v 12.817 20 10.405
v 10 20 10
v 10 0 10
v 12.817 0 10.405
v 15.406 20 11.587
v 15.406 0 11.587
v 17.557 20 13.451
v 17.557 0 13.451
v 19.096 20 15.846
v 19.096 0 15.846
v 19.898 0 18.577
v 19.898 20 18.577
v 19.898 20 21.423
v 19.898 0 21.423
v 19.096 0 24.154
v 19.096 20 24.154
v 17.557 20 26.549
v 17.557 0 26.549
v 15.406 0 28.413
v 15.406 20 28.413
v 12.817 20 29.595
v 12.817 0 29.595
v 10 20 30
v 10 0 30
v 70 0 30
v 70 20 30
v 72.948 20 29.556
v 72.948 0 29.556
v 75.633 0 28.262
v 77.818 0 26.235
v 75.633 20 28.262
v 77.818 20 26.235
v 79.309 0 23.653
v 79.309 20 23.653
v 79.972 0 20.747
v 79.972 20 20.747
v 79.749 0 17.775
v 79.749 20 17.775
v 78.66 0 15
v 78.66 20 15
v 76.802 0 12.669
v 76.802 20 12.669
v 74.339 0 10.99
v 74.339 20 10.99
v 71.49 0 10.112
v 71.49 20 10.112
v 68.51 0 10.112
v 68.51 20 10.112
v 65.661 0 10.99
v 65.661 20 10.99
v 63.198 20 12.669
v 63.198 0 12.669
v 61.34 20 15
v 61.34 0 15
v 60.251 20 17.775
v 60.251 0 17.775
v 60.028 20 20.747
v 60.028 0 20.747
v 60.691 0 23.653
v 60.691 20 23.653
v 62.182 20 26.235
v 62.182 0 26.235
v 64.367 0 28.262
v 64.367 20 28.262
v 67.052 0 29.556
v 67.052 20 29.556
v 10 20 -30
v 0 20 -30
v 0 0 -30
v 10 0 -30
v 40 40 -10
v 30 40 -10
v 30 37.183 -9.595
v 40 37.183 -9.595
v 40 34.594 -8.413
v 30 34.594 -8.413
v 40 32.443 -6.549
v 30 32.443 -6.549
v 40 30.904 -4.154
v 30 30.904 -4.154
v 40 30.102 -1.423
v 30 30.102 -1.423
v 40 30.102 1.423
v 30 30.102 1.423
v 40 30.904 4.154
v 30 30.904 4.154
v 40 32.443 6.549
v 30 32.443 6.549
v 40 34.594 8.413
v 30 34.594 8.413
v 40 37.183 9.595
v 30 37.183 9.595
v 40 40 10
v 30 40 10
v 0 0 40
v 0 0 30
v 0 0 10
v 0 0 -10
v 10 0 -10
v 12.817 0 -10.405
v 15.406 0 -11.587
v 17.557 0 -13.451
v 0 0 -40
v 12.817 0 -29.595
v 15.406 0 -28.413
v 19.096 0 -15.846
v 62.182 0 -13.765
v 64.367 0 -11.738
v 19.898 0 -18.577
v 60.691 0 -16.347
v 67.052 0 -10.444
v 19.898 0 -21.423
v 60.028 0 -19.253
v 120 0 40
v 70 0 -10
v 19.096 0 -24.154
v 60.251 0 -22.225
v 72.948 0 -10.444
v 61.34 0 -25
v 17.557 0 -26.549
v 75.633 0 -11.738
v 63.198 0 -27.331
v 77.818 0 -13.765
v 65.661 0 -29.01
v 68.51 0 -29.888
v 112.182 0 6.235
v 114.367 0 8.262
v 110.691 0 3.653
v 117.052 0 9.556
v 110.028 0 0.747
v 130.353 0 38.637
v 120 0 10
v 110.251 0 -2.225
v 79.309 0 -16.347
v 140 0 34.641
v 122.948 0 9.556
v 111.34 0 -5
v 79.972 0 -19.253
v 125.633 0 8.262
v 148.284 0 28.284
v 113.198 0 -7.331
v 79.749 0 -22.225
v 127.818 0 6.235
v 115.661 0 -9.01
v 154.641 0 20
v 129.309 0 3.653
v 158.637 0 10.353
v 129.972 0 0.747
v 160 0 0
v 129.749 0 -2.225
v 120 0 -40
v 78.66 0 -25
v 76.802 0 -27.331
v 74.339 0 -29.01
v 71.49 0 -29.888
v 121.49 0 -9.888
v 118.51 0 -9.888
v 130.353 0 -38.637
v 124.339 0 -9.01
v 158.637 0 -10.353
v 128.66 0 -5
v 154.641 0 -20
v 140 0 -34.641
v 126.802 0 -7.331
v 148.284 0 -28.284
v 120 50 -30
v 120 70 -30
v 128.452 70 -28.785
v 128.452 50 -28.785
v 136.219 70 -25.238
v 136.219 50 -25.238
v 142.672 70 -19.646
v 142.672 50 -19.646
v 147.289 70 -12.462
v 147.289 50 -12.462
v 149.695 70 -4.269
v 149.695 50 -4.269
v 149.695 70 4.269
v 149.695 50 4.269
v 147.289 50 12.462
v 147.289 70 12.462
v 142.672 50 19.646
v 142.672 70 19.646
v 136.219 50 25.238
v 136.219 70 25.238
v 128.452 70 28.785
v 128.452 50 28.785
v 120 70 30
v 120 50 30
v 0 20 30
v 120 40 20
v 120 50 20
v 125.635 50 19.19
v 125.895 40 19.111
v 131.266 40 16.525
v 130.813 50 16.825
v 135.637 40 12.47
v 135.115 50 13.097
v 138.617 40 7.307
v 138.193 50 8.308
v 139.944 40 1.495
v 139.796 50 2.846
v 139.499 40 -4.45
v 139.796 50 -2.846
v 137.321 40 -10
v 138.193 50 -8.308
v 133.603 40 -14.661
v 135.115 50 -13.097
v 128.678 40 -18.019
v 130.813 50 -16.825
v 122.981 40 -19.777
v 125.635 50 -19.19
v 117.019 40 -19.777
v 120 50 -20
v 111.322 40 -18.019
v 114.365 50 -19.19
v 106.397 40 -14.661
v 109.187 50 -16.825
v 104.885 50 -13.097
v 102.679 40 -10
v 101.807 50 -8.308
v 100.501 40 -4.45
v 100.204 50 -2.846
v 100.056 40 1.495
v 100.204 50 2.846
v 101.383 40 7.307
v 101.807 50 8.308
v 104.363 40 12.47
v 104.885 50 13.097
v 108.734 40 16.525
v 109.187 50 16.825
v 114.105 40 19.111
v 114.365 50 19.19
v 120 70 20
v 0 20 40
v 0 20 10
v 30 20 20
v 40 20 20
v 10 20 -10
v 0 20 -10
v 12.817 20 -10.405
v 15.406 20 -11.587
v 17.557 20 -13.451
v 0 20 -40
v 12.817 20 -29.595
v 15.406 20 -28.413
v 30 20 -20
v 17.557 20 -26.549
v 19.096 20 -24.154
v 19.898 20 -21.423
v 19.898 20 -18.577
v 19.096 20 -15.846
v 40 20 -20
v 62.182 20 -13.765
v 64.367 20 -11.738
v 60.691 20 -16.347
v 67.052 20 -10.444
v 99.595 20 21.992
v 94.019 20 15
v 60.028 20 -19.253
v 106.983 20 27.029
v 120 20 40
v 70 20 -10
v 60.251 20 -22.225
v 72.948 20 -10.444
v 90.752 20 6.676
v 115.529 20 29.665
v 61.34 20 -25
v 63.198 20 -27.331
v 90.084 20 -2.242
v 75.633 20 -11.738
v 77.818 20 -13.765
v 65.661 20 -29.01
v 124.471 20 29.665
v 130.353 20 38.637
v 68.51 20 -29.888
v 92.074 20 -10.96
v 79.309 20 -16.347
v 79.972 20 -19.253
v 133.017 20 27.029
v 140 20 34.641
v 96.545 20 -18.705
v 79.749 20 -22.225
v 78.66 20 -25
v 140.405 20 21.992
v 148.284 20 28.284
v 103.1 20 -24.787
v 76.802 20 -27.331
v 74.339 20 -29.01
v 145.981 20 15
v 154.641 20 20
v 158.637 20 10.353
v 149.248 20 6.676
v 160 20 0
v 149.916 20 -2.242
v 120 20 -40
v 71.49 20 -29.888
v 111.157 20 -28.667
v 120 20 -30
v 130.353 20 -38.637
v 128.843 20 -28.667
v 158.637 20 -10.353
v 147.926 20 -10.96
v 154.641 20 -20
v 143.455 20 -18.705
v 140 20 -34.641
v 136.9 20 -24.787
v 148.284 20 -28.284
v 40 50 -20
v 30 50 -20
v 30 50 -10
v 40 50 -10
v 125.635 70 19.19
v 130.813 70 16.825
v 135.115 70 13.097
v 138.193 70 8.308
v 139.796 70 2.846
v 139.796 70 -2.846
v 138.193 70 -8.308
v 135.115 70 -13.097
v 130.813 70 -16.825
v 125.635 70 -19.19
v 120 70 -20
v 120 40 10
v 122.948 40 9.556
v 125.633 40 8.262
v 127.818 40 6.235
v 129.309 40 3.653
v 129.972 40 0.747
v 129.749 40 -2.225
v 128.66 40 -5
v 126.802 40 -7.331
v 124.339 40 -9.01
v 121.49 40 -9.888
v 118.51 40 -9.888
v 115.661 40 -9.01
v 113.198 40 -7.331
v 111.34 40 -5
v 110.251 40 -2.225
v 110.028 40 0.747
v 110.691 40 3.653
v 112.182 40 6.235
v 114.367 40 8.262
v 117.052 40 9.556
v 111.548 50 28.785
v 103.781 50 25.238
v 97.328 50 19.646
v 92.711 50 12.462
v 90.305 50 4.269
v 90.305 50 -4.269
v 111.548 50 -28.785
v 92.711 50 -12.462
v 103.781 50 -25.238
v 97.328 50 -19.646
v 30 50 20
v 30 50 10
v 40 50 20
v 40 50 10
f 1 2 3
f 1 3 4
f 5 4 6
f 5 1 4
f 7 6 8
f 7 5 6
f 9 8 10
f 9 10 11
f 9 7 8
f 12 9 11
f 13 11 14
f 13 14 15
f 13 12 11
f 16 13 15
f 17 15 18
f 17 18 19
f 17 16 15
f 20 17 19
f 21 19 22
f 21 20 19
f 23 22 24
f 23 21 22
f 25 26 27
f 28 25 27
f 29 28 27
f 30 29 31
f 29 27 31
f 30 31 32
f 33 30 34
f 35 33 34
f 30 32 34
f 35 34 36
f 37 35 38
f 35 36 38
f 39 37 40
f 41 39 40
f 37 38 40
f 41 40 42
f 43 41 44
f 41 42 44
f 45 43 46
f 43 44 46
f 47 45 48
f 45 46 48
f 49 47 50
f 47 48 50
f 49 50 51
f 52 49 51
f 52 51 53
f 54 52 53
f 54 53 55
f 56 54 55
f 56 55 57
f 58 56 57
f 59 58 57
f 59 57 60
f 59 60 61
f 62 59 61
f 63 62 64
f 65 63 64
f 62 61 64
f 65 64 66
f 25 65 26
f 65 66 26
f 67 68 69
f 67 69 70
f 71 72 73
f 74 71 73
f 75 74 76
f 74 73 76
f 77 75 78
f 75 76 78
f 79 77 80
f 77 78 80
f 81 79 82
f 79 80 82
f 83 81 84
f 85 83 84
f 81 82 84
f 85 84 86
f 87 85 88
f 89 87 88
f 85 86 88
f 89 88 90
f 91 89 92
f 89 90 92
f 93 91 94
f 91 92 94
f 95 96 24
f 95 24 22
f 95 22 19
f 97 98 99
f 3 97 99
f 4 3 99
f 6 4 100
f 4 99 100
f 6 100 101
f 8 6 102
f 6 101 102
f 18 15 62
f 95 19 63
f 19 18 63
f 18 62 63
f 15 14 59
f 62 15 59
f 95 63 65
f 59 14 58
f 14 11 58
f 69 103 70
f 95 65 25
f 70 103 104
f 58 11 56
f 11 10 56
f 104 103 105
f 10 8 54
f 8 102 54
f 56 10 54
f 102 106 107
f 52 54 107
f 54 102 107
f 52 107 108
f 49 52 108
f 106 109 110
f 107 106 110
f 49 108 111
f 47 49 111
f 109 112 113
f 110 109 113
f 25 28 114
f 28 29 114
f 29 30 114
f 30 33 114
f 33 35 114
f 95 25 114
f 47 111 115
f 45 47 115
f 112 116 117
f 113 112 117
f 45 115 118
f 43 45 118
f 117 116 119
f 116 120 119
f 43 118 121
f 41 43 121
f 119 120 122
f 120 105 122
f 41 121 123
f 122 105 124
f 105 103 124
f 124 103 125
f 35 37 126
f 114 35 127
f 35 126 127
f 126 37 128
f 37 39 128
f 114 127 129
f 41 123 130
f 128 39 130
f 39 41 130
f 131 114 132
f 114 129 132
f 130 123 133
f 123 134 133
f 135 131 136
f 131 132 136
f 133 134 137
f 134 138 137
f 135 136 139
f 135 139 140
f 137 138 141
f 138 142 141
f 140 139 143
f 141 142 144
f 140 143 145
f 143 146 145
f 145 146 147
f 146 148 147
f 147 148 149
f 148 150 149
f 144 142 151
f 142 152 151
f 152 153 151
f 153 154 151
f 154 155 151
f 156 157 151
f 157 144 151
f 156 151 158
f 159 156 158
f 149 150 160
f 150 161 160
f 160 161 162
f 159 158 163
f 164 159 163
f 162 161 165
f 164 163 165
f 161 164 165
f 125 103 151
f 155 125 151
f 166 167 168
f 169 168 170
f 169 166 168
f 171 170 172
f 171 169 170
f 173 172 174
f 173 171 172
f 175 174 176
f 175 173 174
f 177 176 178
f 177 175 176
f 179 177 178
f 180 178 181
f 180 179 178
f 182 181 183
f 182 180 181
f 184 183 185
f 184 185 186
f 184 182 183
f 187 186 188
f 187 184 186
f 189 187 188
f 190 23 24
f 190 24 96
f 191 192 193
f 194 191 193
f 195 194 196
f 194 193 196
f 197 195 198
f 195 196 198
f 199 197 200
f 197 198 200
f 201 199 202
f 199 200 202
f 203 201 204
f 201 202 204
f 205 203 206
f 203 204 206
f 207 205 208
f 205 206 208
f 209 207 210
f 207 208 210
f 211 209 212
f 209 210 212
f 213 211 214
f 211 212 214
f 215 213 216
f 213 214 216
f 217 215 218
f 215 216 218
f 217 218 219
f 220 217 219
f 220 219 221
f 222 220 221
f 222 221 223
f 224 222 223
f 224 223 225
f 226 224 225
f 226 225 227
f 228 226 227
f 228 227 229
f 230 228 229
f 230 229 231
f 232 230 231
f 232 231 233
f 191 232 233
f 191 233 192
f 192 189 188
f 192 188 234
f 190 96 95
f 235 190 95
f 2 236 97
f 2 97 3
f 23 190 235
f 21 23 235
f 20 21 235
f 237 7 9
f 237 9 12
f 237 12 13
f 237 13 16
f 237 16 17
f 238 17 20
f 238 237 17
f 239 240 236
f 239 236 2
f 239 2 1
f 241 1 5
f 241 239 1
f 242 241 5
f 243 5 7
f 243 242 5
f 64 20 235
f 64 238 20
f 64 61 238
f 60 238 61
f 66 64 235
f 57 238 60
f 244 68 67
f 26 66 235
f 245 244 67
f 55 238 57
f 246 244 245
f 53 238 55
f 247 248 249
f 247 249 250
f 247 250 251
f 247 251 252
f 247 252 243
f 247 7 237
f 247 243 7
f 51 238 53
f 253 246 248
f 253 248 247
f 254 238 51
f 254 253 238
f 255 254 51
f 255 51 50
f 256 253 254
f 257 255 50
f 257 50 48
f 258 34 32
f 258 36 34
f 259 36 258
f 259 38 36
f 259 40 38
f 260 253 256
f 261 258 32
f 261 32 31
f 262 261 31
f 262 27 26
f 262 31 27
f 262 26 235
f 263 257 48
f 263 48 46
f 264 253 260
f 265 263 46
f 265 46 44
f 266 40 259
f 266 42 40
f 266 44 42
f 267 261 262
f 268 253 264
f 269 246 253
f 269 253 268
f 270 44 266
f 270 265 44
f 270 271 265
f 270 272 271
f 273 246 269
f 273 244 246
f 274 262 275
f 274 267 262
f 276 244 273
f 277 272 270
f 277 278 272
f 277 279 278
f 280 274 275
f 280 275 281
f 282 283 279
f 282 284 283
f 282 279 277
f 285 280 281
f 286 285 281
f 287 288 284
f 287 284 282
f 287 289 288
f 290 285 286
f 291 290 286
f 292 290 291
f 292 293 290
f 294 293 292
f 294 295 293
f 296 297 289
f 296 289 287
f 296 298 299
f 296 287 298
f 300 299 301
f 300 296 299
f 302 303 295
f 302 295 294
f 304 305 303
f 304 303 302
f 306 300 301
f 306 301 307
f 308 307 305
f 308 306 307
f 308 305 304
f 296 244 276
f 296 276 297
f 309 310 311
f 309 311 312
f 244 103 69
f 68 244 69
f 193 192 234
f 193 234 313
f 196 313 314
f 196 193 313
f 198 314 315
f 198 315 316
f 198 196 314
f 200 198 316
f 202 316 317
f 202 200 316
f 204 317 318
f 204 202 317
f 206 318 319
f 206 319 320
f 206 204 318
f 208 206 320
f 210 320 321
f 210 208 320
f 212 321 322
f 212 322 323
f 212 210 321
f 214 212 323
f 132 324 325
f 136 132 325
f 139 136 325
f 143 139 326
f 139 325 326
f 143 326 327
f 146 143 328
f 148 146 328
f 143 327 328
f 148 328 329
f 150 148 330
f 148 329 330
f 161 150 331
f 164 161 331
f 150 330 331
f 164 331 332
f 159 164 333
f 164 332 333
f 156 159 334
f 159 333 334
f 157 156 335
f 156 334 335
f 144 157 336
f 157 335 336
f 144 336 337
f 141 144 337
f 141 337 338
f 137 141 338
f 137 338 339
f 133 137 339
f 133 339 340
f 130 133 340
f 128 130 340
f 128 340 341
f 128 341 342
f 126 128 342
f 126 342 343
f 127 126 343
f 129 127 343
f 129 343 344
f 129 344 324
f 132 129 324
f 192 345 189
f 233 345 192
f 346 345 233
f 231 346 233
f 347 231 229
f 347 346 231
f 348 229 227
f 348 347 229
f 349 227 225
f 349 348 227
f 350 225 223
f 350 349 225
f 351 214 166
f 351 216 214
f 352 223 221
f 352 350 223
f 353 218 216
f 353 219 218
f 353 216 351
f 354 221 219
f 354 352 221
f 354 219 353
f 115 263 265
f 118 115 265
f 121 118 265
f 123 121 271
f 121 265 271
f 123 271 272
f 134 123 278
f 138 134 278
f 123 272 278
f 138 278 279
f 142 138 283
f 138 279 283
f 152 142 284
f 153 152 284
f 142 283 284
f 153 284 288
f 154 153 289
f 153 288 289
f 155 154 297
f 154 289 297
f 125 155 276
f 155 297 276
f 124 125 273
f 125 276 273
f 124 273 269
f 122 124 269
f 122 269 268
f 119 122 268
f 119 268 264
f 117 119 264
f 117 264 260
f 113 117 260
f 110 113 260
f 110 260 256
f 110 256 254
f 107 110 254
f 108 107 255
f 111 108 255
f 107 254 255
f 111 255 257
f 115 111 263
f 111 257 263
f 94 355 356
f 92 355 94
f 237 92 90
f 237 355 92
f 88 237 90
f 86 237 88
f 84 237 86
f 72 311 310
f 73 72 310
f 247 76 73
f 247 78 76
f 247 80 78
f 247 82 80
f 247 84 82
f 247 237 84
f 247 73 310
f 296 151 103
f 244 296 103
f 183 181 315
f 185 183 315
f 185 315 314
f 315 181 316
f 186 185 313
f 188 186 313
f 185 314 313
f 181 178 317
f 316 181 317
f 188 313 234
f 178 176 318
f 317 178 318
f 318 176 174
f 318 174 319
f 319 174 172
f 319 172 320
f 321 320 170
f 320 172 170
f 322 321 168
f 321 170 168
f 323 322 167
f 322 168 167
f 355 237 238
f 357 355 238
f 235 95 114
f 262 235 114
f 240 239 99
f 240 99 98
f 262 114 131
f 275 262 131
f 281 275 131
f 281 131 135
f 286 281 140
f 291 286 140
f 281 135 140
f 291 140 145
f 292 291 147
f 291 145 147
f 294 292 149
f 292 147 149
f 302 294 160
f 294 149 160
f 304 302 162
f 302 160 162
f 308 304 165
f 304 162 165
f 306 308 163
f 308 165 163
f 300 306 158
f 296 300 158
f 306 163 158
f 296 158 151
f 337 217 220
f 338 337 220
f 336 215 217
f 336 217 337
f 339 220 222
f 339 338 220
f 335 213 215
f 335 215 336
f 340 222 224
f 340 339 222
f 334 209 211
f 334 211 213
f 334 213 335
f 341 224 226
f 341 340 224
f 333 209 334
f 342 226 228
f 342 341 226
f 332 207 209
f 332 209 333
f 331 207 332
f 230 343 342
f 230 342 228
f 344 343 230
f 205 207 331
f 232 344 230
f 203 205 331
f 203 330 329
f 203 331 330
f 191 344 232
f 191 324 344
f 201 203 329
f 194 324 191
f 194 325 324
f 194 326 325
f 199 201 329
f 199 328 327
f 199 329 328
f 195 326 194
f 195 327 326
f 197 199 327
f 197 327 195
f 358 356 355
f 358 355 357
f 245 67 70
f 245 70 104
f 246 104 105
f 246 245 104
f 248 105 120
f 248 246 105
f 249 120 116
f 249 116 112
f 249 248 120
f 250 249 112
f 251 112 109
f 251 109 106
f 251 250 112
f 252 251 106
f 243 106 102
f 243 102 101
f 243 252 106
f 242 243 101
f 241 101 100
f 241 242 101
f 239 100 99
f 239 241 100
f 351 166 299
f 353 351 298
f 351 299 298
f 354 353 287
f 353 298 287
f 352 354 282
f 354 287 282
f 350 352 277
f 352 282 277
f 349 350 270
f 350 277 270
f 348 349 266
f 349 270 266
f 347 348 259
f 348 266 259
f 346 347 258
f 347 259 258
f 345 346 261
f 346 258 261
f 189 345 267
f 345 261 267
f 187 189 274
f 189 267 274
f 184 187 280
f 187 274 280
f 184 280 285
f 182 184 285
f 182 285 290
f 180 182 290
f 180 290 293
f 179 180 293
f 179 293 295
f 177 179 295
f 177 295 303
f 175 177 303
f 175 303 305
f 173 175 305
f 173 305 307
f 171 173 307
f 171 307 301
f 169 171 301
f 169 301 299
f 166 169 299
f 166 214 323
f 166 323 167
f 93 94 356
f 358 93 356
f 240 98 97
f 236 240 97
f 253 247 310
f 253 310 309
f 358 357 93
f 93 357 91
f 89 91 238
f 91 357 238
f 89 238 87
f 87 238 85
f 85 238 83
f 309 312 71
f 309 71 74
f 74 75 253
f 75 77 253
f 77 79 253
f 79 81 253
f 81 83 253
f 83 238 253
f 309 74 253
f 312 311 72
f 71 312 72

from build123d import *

# Parameters (mm, degrees)
BOSS_EXTRUDE1_DEPTH = 20
CUT_EXTRUDE1_DEPTH  = 20
SKETCH4_R           = 10
CUT_EXTRUDE2_DEPTH  = 20
SKETCH5_R           = 20
BOSS_EXTRUDE2_DEPTH = 20
SKETCH6_R           = 30
BOSS_EXTRUDE3_DEPTH = 30
SKETCH7_R           = 20
CUT_EXTRUDE3_DEPTH  = 10
SKETCH8_R           = 10
CUT_EXTRUDE4_DEPTH  = 72
BOSS_EXTRUDE4_DEPTH = 20
SKETCH10_W          = 10
SKETCH10_H          = 40
BOSS_EXTRUDE5_DEPTH = 30
CUT_EXTRUDE5_DEPTH  = 30


with BuildPart() as part:
    # Sketch2 → Boss-Extrude1 (new body)
    with BuildSketch(Plane(origin=(0, 0, 0), x_dir=(1, 0, 0), z_dir=(0, 1, 0))):
        with BuildLine():
            Line((0, 40), (0, -40))
            Line((0, -40), (120, -40))
            ThreePointArc((120, -40), (160, 0), (120, 40))
            Line((120, 40), (0, 40))
        make_face()
    extrude(amount=BOSS_EXTRUDE1_DEPTH)

    # Sketch3 → Cut-Extrude1 (cut)
    with BuildSketch(Plane(origin=(0, 20, 0), x_dir=(1, 0, 0), z_dir=(0, 1, 0))):
        with BuildLine():
            Line((0, 30), (10, 30))
            ThreePointArc((10, 30), (20, 20), (10, 10))
            Line((10, 10), (0, 10))
            Line((0, 10), (0, 30))
        make_face()
        with BuildLine():
            Line((0, -10), (10, -10))
            ThreePointArc((10, -10), (20, -20), (10, -30))
            Line((10, -30), (0, -30))
            Line((0, -30), (0, -10))
        make_face()
    extrude(amount=-CUT_EXTRUDE1_DEPTH, mode=Mode.SUBTRACT)

    # Sketch4 → Cut-Extrude2 (cut)
    with BuildSketch(Plane(origin=(0, 20, 0), x_dir=(1, 0, 0), z_dir=(0, 1, 0))):
        with Locations(Location((70, 20, 0), (0, 0, 270))):
            Circle(SKETCH4_R)
        with Locations(Location((70, -20, 0), (0, 0, 270))):
            Circle(SKETCH4_R)
    extrude(amount=-CUT_EXTRUDE2_DEPTH, mode=Mode.SUBTRACT)

    # Sketch5 → Boss-Extrude2 (add)
    with BuildSketch(Plane(origin=(0, 20, 0), x_dir=(1, 0, 0), z_dir=(0, 1, 0))):
        with Locations(Location((120, 0, 0), (0, 0, 90))):
            Circle(SKETCH5_R)
    extrude(amount=BOSS_EXTRUDE2_DEPTH)

    # Sketch6 → Boss-Extrude3 (add)
    with BuildSketch(Plane(origin=(0, 20, 0), x_dir=(1, 0, 0), z_dir=(0, 1, 0))):
        with Locations(Location((120, 0, 0), (0, 0, 90))):
            Circle(SKETCH6_R)
    extrude(amount=BOSS_EXTRUDE3_DEPTH)

    # Sketch7 → Cut-Extrude3 (cut)
    with BuildSketch(Plane(origin=(0, 50, 0), x_dir=(1, 0, 0), z_dir=(0, 1, 0))):
        with Locations(Location((120, 0, 0), (0, 0, 270))):
            Circle(SKETCH7_R)
    extrude(amount=-CUT_EXTRUDE3_DEPTH, mode=Mode.SUBTRACT)

    # Sketch8 → Cut-Extrude4 (cut)
    with BuildSketch(Plane(origin=(0, 40, 0), x_dir=(1, 0, 0), z_dir=(0, 1, 0))):
        with Locations(Location((120, 0, 0), (0, 0, 270))):
            Circle(SKETCH8_R)
    extrude(amount=-CUT_EXTRUDE4_DEPTH, mode=Mode.SUBTRACT)

    # Sketch9 → Boss-Extrude4 (add)
    with BuildSketch(Plane(origin=(0, 50, 0), x_dir=(1, 0, 0), z_dir=(0, 1, 0))):
        with BuildLine():
            Line((120, 20), (120, 30))
            ThreePointArc((120, 30), (150, 0), (120, -30))
            Line((120, -30), (120, -20))
            ThreePointArc((120, -20), (140, 0), (120, 20))
        make_face()
    extrude(amount=BOSS_EXTRUDE4_DEPTH)

    # Sketch10 → Boss-Extrude5 (add)
    with BuildSketch(Plane(origin=(0, 20, 0), x_dir=(1, 0, 0), z_dir=(0, 1, 0))):
        with Locations((35, 0)):
            Rectangle(SKETCH10_W, SKETCH10_H)
    extrude(amount=BOSS_EXTRUDE5_DEPTH)

    # Sketch11 → Cut-Extrude5 (cut)
    with BuildSketch(Plane.ZY.offset(-30)):
        with BuildLine():
            Line((-10, 50), (-10, 40))
            ThreePointArc((-10, 40), (0, 30), (10, 40))
            Line((10, 40), (10, 50))
            Line((10, 50), (-10, 50))
        make_face()
    extrude(amount=-CUT_EXTRUDE5_DEPTH, mode=Mode.SUBTRACT)


solid = part.part
